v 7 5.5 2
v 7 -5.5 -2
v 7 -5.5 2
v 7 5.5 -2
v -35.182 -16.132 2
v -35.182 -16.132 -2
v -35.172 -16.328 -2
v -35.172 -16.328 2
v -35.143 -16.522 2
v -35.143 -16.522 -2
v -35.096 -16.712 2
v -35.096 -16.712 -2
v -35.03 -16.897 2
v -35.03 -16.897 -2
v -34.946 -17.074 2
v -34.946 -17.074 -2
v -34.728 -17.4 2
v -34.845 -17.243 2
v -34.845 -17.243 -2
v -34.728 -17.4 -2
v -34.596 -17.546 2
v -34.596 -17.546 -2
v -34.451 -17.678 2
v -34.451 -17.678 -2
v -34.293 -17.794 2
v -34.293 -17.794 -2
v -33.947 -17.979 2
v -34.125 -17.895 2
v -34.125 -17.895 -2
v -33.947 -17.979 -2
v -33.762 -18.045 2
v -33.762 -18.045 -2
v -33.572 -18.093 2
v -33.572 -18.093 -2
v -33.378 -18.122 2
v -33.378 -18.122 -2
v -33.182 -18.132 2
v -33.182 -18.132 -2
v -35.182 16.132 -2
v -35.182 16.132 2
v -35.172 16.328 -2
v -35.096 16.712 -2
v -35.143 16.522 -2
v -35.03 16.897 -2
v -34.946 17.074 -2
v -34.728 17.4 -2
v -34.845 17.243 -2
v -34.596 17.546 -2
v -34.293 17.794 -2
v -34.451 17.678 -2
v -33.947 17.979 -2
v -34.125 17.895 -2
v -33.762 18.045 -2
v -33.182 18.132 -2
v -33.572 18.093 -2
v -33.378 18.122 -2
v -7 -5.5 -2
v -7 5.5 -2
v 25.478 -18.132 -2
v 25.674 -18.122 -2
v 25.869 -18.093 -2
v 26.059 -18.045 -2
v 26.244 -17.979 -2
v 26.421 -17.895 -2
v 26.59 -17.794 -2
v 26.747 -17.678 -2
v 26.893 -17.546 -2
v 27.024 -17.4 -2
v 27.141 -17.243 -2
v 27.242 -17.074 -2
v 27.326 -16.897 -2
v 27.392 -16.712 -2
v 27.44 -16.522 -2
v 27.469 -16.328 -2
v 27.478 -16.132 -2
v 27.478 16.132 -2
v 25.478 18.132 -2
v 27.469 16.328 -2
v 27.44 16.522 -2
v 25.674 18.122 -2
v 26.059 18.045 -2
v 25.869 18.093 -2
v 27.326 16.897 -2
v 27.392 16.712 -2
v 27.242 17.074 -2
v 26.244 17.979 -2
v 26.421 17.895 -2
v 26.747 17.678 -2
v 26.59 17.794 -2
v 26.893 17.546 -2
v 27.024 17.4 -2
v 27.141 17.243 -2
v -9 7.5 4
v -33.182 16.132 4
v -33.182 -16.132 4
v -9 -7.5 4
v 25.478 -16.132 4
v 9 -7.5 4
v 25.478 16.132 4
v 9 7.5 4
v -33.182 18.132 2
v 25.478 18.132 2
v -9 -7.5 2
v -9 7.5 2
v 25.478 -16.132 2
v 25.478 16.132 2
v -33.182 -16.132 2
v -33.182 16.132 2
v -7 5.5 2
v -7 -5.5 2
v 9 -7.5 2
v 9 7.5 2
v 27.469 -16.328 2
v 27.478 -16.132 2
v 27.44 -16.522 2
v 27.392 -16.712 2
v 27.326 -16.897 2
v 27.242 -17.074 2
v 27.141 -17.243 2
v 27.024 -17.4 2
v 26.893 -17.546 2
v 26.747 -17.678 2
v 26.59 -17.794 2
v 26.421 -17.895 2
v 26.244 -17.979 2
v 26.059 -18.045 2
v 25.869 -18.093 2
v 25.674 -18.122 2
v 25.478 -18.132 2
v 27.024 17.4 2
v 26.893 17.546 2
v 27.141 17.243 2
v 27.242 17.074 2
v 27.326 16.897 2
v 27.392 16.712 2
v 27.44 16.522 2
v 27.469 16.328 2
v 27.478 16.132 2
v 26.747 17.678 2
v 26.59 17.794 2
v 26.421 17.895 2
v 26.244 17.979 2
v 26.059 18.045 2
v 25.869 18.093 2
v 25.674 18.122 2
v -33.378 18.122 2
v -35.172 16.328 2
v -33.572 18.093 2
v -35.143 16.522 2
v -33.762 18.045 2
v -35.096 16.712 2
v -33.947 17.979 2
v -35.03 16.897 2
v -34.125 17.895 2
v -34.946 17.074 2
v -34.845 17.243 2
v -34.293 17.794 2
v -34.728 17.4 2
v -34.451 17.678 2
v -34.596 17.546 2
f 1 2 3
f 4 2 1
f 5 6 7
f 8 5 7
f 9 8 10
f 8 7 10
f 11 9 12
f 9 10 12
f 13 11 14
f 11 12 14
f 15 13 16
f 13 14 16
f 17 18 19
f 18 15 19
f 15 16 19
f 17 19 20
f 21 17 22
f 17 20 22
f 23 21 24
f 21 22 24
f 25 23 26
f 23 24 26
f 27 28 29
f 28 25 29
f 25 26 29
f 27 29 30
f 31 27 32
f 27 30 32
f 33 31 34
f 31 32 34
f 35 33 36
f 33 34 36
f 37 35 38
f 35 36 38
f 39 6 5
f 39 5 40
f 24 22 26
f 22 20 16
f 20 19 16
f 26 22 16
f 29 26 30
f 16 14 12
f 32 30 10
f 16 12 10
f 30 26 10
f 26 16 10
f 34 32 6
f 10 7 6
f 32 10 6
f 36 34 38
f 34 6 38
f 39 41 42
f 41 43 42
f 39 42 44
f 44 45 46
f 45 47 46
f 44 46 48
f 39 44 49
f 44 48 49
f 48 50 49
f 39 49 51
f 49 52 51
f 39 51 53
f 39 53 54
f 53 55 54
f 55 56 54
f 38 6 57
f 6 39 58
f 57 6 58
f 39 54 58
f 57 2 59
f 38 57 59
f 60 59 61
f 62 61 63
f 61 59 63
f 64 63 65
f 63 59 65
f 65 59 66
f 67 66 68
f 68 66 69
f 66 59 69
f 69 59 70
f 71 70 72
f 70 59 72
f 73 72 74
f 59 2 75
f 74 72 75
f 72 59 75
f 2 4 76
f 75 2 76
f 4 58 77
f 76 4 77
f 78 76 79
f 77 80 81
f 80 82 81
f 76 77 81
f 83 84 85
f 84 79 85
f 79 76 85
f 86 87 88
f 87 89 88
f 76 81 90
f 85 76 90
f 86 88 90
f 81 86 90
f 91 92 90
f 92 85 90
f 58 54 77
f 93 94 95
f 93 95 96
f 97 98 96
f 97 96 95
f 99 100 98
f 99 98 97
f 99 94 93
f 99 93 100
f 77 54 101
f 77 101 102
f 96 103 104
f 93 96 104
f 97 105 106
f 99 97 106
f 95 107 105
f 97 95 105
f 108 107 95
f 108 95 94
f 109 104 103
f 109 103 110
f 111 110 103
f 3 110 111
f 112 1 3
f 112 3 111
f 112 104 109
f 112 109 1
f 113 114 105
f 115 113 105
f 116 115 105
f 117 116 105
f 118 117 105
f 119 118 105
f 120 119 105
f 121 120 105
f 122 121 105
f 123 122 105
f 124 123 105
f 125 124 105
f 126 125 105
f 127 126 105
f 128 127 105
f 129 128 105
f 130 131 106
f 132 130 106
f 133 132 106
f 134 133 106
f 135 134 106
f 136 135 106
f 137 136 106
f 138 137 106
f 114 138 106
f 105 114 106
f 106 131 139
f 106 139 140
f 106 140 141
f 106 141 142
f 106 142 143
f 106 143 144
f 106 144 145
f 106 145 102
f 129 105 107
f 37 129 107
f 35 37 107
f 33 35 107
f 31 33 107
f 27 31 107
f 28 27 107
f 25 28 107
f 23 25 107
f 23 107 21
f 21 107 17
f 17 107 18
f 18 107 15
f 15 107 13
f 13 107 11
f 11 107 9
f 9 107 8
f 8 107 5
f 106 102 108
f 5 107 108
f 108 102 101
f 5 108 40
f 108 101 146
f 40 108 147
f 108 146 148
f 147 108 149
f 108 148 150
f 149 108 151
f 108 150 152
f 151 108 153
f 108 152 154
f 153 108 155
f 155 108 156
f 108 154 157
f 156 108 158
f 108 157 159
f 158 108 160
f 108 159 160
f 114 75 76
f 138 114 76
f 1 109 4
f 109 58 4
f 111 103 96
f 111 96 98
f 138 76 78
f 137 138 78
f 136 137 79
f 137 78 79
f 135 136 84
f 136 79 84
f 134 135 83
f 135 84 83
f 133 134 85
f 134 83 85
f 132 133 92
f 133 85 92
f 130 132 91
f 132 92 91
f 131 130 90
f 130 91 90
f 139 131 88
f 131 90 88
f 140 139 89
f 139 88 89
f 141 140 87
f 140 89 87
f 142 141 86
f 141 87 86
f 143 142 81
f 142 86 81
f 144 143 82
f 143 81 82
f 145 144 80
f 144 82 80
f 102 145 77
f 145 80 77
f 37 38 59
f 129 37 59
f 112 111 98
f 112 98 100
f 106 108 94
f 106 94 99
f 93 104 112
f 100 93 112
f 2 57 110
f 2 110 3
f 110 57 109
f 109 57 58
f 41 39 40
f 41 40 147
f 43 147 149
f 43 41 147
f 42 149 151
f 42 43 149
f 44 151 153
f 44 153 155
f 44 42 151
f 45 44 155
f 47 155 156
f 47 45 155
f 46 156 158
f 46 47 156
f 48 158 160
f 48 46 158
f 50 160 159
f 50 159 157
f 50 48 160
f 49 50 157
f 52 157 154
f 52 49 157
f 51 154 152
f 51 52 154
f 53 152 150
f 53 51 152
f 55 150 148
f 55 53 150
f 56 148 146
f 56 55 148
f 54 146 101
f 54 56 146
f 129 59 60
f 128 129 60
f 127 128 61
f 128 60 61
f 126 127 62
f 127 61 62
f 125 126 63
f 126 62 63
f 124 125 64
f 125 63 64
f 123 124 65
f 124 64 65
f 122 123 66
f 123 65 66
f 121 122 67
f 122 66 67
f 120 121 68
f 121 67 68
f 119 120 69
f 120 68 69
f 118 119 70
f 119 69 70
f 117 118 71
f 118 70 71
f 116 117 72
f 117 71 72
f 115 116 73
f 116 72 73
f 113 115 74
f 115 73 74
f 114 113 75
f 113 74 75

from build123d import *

# Parameters (mm, degrees)
F0_W        = 58.6601923168
F0_H        = 32.2631057742
F0_W_2      = 18
F0_H_2      = 15
F1_DEPTH    = 2
F2_T        = 2
F3_T1_DEPTH = 2
F3_T3_DEPTH = 14
F4_DEPTH    = 4


# Not quite as in the source:
# - a fillet or chamfer that OpenCascade refuses, or shapes differently, is made with other operations: its cross-section is extruded or revolved along the edge and cut away or added
# - a feature names something its author has since deleted; it is built from what else it names


with BuildPart() as f1:
    # F0 (on Top) → F1 (new body)
    with BuildSketch(Plane.XY):
        with Locations((-3.8516821679, 0)):
            Rectangle(F0_W, F0_H)
        Rectangle(F0_W_2, F0_H_2, mode=Mode.SUBTRACT)
    extrude(amount=F1_DEPTH)

    # F2
    f2_openings = [f1.faces().sort_by_distance(p)[0] for p in [
        (24.808942, 0, 2),
    ]]
    offset(amount=F2_T, openings=f2_openings, kind=Kind.INTERSECTION)

    # F3: fillet of radius 2 on 8 edges, made by hand

    # F3_s2 → F3_t1 (join)
    with BuildSketch(Plane.XY):
        with BuildLine():
            ThreePointArc((-31.1817783263, 16.1315528871), (-32.5959918887, 15.5457664495), (-33.1817783263, 14.1315528871))
            Line((-33.1817783263, 14.1315528871), (-33.1817783263, 16.1315528871))
            Line((-33.1817783263, 16.1315528871), (-31.1817783263, 16.1315528871))
        make_face()
        with BuildLine():
            ThreePointArc((-33.1817783263, -14.1315528871), (-32.5959918887, -15.5457664495), (-31.1817783263, -16.1315528871))
            Line((-31.1817783263, -16.1315528871), (-33.1817783263, -16.1315528871))
            Line((-33.1817783263, -16.1315528871), (-33.1817783263, -14.1315528871))
        make_face()
        with BuildLine():
            ThreePointArc((25.4784139905, -14.1315528871), (24.8926275528, -15.5457664495), (23.4784139905, -16.1315528871))
            Line((23.4784139905, -16.1315528871), (25.4784139905, -16.1315528871))
            Line((25.4784139905, -16.1315528871), (25.4784139905, -14.1315528871))
        make_face()
        with BuildLine():
            ThreePointArc((25.4784139905, 14.1315528871), (24.8926275528, 15.5457664495), (23.4784139905, 16.1315528871))
            Line((23.4784139905, 16.1315528871), (25.4784139905, 16.1315528871))
            Line((25.4784139905, 16.1315528871), (25.4784139905, 14.1315528871))
        make_face()
    extrude(amount=F3_T1_DEPTH)

    # F3_s4 → F3_t3 (cut)
    with BuildSketch(Plane.XY.offset(-7)):
        with BuildLine():
            ThreePointArc((25.4784139905, -18.1315528871), (26.8926275528, -17.5457664495), (27.4784139905, -16.1315528871))
            Line((27.4784139905, -16.1315528871), (27.4784139905, -18.1315528871))
            Line((27.4784139905, -18.1315528871), (25.4784139905, -18.1315528871))
        make_face()
        with BuildLine():
            ThreePointArc((27.4784139905, 16.1315528871), (26.8926275528, 17.5457664495), (25.4784139905, 18.1315528871))
            Line((25.4784139905, 18.1315528871), (27.4784139905, 18.1315528871))
            Line((27.4784139905, 18.1315528871), (27.4784139905, 16.1315528871))
        make_face()
        with BuildLine():
            ThreePointArc((-35.1817783263, 16.1315528871), (-34.5959918887, 17.5457664495), (-33.1817783263, 18.1315528871))
            Line((-33.1817783263, 18.1315528871), (-35.1817783263, 18.1315528871))
            Line((-35.1817783263, 18.1315528871), (-35.1817783263, 16.1315528871))
        make_face()
        with BuildLine():
            ThreePointArc((-35.1817783263, -16.1315528871), (-34.5959918887, -17.5457664495), (-33.1817783263, -18.1315528871))
            Line((-33.1817783263, -18.1315528871), (-35.1817783263, -18.1315528871))
            Line((-35.1817783263, -18.1315528871), (-35.1817783263, -16.1315528871))
        make_face()
    extrude(amount=F3_T3_DEPTH, mode=Mode.SUBTRACT)

    # F0 (on Top) → F4 (join)
    with BuildSketch(Plane.XY):
        with Locations((-3.8516821679, 0)):
            Rectangle(F0_W, F0_H)
        Rectangle(F0_W_2, F0_H_2, mode=Mode.SUBTRACT)
    extrude(amount=F4_DEPTH)


solid = f1.part
